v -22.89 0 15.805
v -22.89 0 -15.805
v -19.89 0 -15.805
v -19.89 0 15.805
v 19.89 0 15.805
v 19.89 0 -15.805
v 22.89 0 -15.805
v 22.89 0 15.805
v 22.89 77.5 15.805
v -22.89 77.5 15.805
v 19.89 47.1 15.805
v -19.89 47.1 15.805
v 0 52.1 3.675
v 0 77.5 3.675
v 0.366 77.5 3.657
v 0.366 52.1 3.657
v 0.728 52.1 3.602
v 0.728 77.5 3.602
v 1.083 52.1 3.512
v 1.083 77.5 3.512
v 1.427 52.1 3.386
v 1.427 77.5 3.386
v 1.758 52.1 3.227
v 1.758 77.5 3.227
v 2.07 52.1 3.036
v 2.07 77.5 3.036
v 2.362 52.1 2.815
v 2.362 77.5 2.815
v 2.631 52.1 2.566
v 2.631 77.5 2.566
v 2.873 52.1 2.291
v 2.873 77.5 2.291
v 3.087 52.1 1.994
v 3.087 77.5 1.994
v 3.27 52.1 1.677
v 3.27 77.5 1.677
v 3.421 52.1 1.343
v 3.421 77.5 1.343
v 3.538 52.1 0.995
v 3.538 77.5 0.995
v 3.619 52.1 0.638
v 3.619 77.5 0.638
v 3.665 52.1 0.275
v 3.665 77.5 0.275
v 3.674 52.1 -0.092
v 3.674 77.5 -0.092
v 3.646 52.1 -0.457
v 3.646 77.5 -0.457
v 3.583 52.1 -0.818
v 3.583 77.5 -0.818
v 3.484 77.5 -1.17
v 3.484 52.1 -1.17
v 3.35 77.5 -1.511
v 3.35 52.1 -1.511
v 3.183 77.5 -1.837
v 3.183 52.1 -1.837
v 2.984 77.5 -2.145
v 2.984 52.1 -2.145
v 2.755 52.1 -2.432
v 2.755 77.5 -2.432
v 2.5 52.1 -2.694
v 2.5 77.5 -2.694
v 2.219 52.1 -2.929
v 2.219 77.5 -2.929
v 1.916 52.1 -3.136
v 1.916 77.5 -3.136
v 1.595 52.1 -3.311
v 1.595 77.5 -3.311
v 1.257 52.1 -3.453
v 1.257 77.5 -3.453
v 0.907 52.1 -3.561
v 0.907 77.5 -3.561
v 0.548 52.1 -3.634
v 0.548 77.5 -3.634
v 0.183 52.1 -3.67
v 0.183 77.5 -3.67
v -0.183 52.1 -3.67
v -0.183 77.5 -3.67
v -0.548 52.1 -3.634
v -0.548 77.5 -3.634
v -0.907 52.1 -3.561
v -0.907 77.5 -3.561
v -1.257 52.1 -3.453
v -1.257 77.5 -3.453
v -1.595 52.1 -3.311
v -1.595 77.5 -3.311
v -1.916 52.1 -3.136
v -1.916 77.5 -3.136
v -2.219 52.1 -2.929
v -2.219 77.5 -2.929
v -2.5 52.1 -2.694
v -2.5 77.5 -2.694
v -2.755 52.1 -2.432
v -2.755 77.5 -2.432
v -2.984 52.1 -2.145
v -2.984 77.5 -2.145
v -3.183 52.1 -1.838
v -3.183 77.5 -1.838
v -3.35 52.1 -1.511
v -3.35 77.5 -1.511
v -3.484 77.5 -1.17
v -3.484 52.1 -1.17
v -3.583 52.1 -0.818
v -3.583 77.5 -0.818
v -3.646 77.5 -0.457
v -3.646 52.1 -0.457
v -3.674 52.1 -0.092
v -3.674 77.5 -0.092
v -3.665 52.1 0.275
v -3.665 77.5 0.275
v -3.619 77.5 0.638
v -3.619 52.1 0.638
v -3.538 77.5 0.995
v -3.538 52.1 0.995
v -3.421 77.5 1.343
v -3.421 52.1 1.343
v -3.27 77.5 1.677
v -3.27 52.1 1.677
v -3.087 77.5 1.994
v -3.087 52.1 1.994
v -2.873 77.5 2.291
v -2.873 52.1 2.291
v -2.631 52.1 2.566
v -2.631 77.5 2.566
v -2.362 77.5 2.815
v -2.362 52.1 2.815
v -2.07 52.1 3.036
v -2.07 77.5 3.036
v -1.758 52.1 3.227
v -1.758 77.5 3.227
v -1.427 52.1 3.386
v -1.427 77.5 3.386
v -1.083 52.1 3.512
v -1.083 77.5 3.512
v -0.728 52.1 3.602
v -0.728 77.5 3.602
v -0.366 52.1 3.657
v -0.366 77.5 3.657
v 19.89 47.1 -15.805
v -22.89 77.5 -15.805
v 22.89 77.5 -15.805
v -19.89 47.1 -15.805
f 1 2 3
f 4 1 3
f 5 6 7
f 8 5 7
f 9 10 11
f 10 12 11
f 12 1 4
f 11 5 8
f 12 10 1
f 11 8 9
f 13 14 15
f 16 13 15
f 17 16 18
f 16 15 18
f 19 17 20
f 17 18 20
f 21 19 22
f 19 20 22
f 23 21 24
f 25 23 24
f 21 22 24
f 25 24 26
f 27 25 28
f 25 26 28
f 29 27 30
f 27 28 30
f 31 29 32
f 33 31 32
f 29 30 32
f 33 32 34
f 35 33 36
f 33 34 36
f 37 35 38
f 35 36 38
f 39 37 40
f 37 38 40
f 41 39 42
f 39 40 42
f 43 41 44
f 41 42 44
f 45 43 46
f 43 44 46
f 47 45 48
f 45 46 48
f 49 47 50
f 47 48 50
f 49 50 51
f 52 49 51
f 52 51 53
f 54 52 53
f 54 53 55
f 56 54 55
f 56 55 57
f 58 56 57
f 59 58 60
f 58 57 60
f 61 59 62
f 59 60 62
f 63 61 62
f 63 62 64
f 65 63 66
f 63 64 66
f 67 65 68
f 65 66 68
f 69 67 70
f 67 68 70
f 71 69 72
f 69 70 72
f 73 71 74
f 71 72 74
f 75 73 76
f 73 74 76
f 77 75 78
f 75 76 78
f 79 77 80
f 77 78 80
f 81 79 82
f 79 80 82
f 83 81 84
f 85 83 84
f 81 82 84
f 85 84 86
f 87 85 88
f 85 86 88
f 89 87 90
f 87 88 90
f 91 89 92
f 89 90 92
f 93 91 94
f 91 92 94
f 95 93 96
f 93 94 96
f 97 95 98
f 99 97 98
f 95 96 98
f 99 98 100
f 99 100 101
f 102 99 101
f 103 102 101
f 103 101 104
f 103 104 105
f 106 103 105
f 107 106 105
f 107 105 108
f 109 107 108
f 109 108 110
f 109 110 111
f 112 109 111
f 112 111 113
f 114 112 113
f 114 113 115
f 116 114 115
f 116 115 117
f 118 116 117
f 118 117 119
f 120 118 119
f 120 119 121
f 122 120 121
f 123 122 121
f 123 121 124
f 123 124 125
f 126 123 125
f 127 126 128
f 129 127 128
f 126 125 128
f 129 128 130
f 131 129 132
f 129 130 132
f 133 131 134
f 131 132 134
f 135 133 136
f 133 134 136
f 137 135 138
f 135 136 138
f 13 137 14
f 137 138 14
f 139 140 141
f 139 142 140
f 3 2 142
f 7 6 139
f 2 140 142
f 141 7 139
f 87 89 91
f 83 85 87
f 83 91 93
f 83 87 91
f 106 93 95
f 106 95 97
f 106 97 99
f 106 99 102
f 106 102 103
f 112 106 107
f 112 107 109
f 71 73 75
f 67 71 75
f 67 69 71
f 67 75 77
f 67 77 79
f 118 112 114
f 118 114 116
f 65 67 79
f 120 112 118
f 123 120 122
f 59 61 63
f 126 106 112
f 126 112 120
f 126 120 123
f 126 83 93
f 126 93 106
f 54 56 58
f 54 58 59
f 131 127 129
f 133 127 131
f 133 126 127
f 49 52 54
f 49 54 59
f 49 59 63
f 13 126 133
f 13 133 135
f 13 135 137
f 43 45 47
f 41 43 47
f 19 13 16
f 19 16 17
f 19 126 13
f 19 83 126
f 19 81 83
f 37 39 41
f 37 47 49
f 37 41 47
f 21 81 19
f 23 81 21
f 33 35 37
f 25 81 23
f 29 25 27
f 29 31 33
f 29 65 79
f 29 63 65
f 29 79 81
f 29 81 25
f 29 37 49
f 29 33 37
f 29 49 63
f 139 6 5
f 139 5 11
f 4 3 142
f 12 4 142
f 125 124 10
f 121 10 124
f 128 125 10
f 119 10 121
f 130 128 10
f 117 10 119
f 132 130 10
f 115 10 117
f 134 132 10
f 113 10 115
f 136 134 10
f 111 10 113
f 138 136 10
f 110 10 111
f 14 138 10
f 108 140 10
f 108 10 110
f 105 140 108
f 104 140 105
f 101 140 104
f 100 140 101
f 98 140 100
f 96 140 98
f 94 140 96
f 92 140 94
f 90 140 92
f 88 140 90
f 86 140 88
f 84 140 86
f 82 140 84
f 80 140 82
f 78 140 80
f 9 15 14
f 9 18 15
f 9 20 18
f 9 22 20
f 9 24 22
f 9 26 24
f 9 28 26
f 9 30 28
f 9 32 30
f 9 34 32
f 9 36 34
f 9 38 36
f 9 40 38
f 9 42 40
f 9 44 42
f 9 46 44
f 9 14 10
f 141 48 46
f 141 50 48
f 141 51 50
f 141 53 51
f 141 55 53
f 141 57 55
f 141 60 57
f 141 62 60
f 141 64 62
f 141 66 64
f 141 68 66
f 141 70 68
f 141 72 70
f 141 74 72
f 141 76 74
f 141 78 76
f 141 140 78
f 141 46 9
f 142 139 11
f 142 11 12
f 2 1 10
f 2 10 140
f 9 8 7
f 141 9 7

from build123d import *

# Parameters (mm, degrees)
SKETCH1_W           = 45.78
SKETCH1_H           = 31.61
BOSS_EXTRUDE2_DEPTH = 77.5
SKETCH2_R           = 3.675
CUT_EXTRUDE1_DEPTH  = 25.4
SKETCH3_W           = 39.78
SKETCH3_H           = 47.1
CUT_EXTRUDE3_DEPTH  = 87.772081916


with BuildPart() as part:
    # Sketch1 → Boss-Extrude2 (new body)
    with BuildSketch(Plane(origin=(0, 0, 0), x_dir=(1, 0, 0), z_dir=(0, 1, 0))):
        Rectangle(SKETCH1_W, SKETCH1_H)
    extrude(amount=BOSS_EXTRUDE2_DEPTH)

    # Sketch2 → Cut-Extrude1 (cut)
    with BuildSketch(Plane(origin=(0, 77.5, 0), x_dir=(1, 0, 0), z_dir=(0, 1, 0))):
        with Locations(Location((0, 0, 0), (0, 0, 270))):
            Circle(SKETCH2_R)
    extrude(amount=-CUT_EXTRUDE1_DEPTH, mode=Mode.SUBTRACT)

    # Sketch3 → Cut-Extrude3 (cut, through all)
    with BuildSketch(Plane(origin=(0, 0, -15.805), x_dir=(-1, 0, 0), z_dir=(0, 0, -1))):
        with Locations((0, 23.55)):
            Rectangle(SKETCH3_W, SKETCH3_H)
    extrude(amount=-CUT_EXTRUDE3_DEPTH, mode=Mode.SUBTRACT)


solid = part.part
